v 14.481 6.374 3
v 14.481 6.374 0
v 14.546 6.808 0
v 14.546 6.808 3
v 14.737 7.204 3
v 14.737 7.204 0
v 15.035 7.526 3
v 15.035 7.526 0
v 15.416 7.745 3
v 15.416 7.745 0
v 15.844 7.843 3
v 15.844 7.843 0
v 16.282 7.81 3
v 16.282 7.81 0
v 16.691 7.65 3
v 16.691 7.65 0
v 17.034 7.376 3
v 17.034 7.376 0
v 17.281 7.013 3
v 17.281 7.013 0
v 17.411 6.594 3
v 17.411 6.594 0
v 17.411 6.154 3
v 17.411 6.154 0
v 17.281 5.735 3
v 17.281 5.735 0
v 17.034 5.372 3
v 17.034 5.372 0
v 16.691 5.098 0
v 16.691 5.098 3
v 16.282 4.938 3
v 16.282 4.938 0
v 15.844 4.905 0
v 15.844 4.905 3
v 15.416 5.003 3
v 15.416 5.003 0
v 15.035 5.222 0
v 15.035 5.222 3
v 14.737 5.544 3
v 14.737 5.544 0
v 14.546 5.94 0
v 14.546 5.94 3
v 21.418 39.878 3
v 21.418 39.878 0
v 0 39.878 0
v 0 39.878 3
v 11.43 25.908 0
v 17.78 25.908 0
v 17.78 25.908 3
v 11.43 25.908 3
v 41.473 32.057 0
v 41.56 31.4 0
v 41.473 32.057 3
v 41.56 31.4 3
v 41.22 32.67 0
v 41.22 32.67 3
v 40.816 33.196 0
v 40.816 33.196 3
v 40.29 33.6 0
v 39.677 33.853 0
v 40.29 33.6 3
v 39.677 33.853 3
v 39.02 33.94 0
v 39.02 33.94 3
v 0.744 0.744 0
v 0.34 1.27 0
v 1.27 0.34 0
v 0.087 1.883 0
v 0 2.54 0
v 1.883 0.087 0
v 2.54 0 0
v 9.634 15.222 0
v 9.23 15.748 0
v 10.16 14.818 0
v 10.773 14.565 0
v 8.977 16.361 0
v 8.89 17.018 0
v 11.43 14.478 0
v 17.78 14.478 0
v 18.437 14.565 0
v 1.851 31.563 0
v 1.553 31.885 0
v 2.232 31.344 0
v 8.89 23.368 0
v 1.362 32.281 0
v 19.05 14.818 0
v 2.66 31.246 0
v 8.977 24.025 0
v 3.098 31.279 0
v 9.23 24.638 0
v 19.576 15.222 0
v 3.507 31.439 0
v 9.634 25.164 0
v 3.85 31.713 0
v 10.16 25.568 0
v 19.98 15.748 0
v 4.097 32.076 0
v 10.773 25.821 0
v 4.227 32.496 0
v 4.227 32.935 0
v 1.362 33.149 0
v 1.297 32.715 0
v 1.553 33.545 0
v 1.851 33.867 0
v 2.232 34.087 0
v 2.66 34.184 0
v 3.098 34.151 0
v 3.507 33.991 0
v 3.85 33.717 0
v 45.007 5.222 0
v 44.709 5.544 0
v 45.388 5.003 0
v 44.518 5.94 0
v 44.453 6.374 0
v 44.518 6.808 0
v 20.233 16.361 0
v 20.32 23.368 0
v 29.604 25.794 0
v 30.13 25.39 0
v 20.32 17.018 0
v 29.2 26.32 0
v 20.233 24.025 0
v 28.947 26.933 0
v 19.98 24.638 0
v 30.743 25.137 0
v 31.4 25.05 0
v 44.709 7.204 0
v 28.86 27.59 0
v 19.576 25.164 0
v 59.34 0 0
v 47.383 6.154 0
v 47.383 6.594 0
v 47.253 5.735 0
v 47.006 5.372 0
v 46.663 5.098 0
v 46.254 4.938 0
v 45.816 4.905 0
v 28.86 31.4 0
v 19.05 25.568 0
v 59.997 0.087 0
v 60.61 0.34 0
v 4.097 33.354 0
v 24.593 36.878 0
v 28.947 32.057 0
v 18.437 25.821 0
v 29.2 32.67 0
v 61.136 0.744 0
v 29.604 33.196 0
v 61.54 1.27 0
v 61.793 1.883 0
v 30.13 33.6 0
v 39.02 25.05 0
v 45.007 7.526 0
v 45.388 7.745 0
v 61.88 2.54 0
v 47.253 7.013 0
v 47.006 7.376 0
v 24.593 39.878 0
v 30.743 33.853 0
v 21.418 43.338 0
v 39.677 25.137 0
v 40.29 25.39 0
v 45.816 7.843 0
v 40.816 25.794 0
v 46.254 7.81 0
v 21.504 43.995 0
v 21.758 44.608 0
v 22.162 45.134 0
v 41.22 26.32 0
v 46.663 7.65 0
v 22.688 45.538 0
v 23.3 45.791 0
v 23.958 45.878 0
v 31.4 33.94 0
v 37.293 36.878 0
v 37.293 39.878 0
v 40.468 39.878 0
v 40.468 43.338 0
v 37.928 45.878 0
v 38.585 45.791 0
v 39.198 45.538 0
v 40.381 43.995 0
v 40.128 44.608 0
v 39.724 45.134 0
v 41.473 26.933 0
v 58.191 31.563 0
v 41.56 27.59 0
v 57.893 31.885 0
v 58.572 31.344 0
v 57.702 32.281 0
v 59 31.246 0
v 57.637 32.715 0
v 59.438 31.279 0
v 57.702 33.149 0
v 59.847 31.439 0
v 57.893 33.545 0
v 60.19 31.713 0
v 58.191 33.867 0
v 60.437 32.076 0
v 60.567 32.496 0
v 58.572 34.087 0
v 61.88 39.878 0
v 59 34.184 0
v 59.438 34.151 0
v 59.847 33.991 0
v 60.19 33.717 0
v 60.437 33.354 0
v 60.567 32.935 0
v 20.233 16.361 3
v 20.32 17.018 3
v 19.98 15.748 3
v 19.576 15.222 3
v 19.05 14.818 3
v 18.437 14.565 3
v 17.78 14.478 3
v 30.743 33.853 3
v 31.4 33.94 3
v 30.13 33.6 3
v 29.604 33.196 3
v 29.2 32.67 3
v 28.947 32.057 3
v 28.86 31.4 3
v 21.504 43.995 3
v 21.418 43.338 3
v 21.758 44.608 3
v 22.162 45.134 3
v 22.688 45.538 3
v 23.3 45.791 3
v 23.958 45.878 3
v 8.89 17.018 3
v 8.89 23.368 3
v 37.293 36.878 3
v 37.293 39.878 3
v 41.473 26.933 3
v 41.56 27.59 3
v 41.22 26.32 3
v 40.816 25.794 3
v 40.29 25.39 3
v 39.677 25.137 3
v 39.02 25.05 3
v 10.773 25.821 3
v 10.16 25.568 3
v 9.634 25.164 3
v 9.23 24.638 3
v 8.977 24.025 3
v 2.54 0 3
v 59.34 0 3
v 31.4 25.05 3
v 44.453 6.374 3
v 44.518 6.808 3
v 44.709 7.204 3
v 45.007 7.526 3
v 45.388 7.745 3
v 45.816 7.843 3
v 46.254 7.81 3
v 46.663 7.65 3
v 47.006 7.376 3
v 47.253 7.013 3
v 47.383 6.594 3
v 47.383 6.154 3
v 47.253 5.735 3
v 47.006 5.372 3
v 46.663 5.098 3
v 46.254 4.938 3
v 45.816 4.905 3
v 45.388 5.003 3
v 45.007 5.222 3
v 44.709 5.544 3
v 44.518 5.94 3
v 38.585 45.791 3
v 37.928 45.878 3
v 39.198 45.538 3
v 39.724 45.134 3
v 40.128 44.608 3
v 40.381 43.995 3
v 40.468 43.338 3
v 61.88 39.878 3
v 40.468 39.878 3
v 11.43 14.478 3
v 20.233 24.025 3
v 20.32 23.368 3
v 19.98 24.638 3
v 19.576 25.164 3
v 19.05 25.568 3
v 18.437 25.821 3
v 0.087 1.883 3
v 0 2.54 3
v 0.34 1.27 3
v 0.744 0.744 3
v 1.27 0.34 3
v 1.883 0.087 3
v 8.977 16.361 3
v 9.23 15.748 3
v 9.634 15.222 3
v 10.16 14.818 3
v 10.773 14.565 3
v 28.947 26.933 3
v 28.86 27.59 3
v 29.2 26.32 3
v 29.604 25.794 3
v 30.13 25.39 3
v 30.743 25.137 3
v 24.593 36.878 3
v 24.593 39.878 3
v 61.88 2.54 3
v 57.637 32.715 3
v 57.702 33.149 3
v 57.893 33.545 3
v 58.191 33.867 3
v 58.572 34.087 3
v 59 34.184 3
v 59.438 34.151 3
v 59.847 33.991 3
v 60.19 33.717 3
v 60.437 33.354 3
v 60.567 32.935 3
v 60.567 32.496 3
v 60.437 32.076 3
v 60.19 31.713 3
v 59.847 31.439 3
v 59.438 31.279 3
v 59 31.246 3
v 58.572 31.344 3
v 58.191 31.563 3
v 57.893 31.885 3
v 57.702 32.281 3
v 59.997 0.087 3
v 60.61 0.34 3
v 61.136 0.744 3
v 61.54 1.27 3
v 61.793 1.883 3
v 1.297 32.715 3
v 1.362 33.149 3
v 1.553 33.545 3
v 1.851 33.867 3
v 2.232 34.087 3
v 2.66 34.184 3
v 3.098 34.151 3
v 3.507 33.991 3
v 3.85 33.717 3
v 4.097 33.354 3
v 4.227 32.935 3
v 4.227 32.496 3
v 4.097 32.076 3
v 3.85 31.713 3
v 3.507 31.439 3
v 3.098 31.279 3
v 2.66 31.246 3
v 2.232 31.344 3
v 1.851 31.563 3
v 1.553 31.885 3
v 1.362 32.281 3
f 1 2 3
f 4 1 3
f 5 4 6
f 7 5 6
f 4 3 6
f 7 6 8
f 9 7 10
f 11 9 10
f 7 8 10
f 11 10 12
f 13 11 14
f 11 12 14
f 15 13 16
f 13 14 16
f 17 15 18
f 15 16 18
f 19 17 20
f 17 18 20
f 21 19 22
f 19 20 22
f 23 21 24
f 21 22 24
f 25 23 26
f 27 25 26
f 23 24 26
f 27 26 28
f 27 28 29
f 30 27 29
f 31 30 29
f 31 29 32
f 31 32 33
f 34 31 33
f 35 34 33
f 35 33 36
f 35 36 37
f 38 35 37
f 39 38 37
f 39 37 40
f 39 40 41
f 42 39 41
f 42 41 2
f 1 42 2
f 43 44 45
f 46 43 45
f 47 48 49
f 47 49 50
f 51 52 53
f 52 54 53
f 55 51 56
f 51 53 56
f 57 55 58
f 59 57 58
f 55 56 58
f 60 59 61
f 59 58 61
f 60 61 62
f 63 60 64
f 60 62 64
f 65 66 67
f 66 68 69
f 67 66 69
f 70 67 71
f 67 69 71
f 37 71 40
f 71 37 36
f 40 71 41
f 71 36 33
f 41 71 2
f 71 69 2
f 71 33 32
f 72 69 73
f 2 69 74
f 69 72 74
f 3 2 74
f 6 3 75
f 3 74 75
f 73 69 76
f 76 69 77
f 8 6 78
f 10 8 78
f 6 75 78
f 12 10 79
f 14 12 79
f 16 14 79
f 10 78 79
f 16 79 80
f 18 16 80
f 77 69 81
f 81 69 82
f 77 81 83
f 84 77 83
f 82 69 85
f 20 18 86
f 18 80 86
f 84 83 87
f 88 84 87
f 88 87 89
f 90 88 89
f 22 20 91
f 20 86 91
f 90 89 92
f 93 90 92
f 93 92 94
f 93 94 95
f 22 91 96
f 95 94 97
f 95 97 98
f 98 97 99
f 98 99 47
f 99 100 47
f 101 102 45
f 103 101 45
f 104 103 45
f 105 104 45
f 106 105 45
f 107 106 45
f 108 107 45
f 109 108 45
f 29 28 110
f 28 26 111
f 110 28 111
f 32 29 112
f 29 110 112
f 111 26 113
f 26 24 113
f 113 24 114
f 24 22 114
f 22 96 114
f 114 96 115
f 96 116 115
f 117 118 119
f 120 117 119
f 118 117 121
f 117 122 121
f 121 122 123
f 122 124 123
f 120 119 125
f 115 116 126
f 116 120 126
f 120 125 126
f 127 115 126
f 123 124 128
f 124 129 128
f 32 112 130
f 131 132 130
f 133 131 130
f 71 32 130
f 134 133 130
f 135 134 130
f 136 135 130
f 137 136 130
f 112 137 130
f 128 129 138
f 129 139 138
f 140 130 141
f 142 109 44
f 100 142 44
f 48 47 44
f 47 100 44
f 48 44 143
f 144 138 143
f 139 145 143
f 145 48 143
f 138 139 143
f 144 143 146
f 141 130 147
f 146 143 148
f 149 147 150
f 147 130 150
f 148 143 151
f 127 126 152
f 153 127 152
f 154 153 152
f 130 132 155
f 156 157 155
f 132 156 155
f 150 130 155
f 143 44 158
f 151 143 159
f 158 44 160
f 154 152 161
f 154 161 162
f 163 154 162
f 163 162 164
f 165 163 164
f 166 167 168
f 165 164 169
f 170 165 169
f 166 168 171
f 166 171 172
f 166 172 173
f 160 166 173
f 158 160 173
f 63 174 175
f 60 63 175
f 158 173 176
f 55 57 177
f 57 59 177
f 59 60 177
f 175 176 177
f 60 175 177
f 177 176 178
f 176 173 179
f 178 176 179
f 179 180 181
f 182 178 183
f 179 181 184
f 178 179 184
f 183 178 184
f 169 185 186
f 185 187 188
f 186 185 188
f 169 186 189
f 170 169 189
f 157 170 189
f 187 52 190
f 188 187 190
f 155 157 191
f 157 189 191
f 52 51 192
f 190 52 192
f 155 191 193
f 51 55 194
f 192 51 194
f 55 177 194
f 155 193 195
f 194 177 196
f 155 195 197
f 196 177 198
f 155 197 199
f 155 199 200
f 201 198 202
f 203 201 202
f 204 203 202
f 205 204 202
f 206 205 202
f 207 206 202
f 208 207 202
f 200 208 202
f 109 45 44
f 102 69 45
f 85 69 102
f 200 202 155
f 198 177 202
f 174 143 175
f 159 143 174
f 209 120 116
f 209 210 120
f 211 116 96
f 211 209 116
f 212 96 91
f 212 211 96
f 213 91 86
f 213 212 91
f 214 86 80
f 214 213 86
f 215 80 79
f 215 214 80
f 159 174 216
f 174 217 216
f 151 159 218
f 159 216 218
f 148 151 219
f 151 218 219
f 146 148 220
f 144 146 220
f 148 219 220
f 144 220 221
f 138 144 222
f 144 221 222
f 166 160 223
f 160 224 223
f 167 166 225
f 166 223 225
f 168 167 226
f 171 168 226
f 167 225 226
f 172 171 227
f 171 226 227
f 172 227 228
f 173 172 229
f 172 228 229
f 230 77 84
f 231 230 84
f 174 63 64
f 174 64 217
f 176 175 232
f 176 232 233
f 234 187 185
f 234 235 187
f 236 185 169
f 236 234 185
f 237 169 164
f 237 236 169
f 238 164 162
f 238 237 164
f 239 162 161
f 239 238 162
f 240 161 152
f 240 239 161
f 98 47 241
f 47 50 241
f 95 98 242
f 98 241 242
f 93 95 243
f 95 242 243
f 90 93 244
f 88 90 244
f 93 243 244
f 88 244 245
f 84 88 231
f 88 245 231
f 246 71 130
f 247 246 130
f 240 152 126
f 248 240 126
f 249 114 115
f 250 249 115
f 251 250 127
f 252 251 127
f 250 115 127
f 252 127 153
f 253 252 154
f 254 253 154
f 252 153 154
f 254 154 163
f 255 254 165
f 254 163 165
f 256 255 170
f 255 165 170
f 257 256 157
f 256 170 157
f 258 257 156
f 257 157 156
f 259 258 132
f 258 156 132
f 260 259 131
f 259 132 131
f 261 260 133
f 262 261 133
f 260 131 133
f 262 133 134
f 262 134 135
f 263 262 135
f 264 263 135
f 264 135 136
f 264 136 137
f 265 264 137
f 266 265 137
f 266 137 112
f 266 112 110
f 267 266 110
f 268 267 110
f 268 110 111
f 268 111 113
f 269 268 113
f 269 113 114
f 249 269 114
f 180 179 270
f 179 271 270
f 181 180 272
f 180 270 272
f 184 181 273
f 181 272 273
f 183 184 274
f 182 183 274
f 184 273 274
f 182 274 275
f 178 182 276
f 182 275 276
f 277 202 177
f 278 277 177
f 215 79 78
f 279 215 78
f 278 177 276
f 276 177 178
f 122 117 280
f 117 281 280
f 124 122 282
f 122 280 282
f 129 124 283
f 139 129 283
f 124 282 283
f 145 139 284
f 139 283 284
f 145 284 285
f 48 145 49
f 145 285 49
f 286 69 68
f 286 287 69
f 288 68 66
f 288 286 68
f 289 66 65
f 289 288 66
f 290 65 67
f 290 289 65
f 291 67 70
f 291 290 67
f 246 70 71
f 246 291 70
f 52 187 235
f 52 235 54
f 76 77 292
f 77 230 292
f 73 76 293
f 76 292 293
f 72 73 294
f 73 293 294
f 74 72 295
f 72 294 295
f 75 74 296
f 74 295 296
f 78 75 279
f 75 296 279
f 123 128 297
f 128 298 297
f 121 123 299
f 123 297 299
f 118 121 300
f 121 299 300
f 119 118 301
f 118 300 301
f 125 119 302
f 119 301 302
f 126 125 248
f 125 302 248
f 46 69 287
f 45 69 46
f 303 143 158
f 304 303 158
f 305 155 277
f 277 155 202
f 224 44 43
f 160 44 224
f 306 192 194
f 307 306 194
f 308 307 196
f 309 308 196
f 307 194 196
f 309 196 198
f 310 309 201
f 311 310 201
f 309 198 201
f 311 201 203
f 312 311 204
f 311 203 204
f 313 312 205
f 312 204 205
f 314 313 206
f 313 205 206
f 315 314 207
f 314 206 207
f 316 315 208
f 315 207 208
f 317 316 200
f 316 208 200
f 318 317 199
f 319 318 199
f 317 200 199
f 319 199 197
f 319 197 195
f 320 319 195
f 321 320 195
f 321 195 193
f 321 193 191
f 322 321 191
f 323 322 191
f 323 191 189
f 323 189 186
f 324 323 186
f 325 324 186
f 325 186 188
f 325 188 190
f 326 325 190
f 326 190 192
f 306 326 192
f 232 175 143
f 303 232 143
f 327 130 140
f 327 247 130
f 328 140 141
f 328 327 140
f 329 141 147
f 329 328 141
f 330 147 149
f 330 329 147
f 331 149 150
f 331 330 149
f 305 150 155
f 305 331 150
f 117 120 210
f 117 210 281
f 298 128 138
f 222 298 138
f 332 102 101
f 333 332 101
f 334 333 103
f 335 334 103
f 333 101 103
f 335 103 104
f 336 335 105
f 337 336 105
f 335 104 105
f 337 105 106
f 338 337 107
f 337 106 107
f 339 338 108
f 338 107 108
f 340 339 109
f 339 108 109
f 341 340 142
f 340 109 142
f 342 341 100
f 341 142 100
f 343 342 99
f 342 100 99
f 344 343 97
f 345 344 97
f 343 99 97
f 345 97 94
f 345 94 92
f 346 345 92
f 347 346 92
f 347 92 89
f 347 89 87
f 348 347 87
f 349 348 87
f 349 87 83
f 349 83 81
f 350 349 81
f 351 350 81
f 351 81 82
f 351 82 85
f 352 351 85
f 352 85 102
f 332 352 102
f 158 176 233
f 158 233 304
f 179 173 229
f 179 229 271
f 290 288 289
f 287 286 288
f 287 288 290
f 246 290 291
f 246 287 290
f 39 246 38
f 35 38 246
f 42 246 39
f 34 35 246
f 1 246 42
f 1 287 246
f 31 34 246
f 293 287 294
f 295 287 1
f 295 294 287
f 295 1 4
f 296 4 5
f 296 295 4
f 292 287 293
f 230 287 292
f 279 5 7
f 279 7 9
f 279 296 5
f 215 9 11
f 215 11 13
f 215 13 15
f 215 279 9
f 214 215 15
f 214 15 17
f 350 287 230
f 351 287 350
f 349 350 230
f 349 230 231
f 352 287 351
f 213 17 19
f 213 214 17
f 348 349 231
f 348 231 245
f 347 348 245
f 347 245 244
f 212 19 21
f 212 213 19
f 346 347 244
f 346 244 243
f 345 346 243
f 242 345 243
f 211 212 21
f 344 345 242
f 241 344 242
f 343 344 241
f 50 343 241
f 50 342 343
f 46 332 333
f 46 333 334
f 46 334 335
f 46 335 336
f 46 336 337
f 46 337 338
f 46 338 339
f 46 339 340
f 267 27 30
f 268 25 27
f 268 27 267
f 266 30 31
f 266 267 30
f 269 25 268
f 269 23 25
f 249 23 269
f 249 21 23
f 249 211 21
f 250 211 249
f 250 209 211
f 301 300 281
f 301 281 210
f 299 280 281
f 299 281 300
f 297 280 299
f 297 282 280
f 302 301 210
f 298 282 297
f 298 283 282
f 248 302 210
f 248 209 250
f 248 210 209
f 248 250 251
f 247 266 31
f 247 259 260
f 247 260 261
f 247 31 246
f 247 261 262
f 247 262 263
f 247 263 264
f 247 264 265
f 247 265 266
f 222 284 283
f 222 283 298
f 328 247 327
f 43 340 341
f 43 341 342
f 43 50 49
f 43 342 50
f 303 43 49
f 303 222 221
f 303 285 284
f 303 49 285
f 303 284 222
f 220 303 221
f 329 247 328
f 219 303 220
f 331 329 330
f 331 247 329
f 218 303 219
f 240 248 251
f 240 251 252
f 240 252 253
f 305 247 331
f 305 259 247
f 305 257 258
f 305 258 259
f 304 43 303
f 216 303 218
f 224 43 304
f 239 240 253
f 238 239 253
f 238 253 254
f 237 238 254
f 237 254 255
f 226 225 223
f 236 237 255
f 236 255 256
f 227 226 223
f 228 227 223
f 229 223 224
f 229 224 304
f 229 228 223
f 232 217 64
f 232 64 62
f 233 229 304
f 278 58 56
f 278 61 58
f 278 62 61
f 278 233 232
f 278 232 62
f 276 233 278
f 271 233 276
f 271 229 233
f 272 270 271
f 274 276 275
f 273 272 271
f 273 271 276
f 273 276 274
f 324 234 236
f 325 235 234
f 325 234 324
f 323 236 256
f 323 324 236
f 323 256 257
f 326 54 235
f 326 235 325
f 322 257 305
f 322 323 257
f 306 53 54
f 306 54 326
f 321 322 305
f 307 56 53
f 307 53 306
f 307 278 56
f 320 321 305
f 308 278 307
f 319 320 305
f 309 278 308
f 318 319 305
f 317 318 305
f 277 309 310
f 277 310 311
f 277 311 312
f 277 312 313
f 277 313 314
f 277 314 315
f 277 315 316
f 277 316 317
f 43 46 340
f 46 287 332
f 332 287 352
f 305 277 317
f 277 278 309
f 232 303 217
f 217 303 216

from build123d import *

# Parameters (mm, degrees)
SKETCH1_W                   = 61.88
SKETCH1_H                   = 45.878000096
BOSS_EXTRUDE1_DEPTH         = 3
F_32_0_116_DIAMETER_HOLE1_D = 2.9464
FILLET1_R                   = 2.54
SKETCH6_W                   = 12.7
SKETCH6_H                   = 3
CUT_EXTRUDE1_DEPTH          = 3
SKETCH7_W                   = 12.7
SKETCH7_H                   = 8.89
SKETCH7_W_2                 = 11.43
SKETCH7_H_2                 = 11.43
CUT_EXTRUDE2_DEPTH          = 78.090370947
FILLET2_R                   = 2.54
SKETCH9_W                   = 21.4122
SKETCH9_H                   = 6.000000096
SKETCH9_W_2                 = 21.4178
CUT_EXTRUDE3_DEPTH          = 78.090370947
FILLET4_R                   = 2.54


with BuildPart() as part:
    # Sketch1 → Boss-Extrude1 (new body)
    with BuildSketch(Plane.XY):
        with Locations((30.94, 22.939000048)):
            Rectangle(SKETCH1_W, SKETCH1_H)
    extrude(amount=BOSS_EXTRUDE1_DEPTH)

    # #32 (0.116) Diameter Hole1 (through all)
    with Locations(Plane.XY.offset(3)):
        with Locations((15.954, 6.373999952), (45.926, 6.373999952), (59.11, 32.7152), (2.77, 32.7152)):
            Hole(F_32_0_116_DIAMETER_HOLE1_D / 2)

    # Fillet1
    fillet1_edges = [part.edges().sort_by_distance(p)[0] for p in [
        (61.88, 0, 1.5),
        (0, 0, 1.5),
    ]]
    fillet(fillet1_edges, radius=FILLET1_R)

    # Sketch6 → Cut-Extrude1 (cut)
    with BuildSketch(Plane(origin=(0, 0, 0), x_dir=(-1, 0, 0), z_dir=(0, 0, -1))):
        with Locations((-30.9428, 38.378)):
            Rectangle(SKETCH6_W, SKETCH6_H)
    extrude(amount=-CUT_EXTRUDE1_DEPTH, mode=Mode.SUBTRACT)

    # Sketch7 → Cut-Extrude2 (cut, through all)
    with BuildSketch(Plane(origin=(0, 0, 0), x_dir=(-1, 0, 0), z_dir=(0, 0, -1))):
        with Locations((-35.21, 29.495000096)):
            Rectangle(SKETCH7_W, SKETCH7_H)
        with Locations((-14.605, 20.193)):
            Rectangle(SKETCH7_W_2, SKETCH7_H_2)
    extrude(amount=-CUT_EXTRUDE2_DEPTH, mode=Mode.SUBTRACT)

    # Fillet2
    fillet2_edges = [part.edges().sort_by_distance(p)[0] for p in [
        (41.56, 25.050000096, 1.5),
        (41.56, 33.940000096, 1.5),
        (28.86, 33.940000096, 1.5),
        (28.86, 25.050000096, 1.5),
        (20.32, 14.478, 1.5),
        (20.32, 25.908, 1.5),
        (8.89, 25.908, 1.5),
        (8.89, 14.478, 1.5),
    ]]
    fillet(fillet2_edges, radius=FILLET2_R)

    # Sketch9 → Cut-Extrude3 (cut, through all)
    with BuildSketch(Plane(origin=(0, 0, 0), x_dir=(-1, 0, 0), z_dir=(0, 0, -1))):
        with Locations((-51.1739, 42.878000048)):
            Rectangle(SKETCH9_W, SKETCH9_H)
        with Locations((-10.7089, 42.878000048)):
            Rectangle(SKETCH9_W_2, SKETCH9_H)
    extrude(amount=-CUT_EXTRUDE3_DEPTH, mode=Mode.SUBTRACT)

    # Fillet4
    fillet4_edges = [part.edges().sort_by_distance(p)[0] for p in [
        (40.4678, 45.878000096, 1.5),
        (21.4178, 45.878000096, 1.5),
    ]]
    fillet(fillet4_edges, radius=FILLET4_R)


solid = part.part
